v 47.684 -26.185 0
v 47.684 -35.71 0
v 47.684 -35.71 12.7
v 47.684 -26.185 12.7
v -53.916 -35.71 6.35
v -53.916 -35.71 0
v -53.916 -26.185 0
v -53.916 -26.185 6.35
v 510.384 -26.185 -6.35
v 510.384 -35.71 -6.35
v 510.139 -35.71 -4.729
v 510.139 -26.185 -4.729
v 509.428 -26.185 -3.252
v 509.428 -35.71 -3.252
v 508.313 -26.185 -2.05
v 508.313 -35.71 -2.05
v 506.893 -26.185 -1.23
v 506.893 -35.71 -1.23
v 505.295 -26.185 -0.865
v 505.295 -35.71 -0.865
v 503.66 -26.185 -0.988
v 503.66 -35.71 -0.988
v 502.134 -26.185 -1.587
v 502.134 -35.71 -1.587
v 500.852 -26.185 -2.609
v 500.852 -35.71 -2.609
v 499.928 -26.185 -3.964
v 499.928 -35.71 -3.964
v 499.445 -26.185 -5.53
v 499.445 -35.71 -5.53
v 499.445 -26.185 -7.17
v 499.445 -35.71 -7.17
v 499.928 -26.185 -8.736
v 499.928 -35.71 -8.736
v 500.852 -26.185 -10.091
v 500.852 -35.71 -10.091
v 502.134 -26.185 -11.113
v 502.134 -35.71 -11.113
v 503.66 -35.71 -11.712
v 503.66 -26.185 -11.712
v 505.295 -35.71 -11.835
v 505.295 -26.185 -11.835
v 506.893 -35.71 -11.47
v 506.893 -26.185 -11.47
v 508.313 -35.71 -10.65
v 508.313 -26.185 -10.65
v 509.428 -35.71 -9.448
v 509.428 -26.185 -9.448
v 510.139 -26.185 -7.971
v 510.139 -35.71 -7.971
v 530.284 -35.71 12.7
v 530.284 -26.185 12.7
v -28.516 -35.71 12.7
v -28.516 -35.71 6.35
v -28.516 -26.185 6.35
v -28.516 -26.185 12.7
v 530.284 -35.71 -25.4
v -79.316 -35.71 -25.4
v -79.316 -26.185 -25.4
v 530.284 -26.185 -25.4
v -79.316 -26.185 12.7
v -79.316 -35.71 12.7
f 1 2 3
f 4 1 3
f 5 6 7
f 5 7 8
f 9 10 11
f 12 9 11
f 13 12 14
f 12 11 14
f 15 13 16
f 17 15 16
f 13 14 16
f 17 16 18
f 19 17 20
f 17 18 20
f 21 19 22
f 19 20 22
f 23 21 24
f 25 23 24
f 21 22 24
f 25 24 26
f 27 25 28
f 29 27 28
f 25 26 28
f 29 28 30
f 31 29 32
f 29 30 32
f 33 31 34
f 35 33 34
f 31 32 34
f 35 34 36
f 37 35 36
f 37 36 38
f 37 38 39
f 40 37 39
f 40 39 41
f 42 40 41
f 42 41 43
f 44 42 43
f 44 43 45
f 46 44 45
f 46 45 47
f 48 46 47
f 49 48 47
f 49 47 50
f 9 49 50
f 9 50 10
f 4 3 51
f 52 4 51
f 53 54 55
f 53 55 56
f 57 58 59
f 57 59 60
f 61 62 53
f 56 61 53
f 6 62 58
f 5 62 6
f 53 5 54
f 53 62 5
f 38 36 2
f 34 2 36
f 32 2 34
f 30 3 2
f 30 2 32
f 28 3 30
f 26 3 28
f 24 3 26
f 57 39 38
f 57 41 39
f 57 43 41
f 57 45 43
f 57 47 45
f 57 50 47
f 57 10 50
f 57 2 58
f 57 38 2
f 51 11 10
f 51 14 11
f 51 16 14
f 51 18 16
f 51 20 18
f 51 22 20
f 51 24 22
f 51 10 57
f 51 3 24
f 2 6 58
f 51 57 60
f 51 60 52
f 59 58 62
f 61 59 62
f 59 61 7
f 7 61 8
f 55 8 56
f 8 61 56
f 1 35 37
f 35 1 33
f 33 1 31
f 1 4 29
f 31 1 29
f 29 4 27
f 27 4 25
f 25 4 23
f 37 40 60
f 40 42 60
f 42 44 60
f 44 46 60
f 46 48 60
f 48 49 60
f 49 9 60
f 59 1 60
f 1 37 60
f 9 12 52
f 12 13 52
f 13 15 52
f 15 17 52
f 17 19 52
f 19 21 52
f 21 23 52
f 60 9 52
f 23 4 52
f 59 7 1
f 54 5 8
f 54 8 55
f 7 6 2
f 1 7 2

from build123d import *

# Parameters (mm, degrees)
F0_W     = 101.6
F0_H     = 44.45
F1_DEPTH = 6.35
F2_W     = 609.6
F2_H     = 38.1
F2_W_2   = 101.6
F2_H_2   = 6.35
F3_DEPTH = 9.525
F4_DEPTH = 9.525
F6_W     = 76.2
F6_H     = 25.4
F7_DEPTH = 25.4
F8_R     = 5.5
F9_DEPTH = 25.4


# Not quite as in the source:
# - ends of sketch curves that miss each other by under 0.0002 mm in the source are joined


with BuildPart() as f1:
    # F0 (on Top) → F1 (new body)
    with BuildSketch(Plane.XY):
        with Locations((-3.1162388623, -13.4853734154)):
            Rectangle(F0_W, F0_H)
    extrude(amount=F1_DEPTH)

    # F2 (on face) → F4 (cut)
    with BuildSketch(Plane.XZ.offset(35.7103734154)):
        with Locations((-3.1162388623, 3.175)):
            Rectangle(F2_W_2, F2_H_2)
    extrude(amount=-F4_DEPTH, mode=Mode.SUBTRACT)


with BuildPart() as f3:
    # F2 (on face) → F3 (new body)
    with BuildSketch(Plane.XZ.offset(35.7103734154)):
        with Locations((225.4837611377, -6.35)):
            Rectangle(F2_W, F2_H)
        with Locations((-3.1162388623, 3.175)):
            Rectangle(F2_W_2, F2_H_2, mode=Mode.SUBTRACT)
    extrude(amount=-F3_DEPTH)

    # F6 (on face) → F7 (cut)
    with BuildSketch(Plane.XZ.offset(35.7103734154)):
        with Locations((9.5837611377, 19.05)):
            Rectangle(F6_W, F6_H)
    extrude(amount=-F7_DEPTH, mode=Mode.SUBTRACT)

    # F8 (on face) → F9 (cut)
    with BuildSketch(Plane.XZ.offset(35.7103734154)):
        with Locations((504.8837611377, -6.35)):
            Circle(F8_R)
    extrude(amount=-F9_DEPTH, mode=Mode.SUBTRACT)


solid = f3.part
